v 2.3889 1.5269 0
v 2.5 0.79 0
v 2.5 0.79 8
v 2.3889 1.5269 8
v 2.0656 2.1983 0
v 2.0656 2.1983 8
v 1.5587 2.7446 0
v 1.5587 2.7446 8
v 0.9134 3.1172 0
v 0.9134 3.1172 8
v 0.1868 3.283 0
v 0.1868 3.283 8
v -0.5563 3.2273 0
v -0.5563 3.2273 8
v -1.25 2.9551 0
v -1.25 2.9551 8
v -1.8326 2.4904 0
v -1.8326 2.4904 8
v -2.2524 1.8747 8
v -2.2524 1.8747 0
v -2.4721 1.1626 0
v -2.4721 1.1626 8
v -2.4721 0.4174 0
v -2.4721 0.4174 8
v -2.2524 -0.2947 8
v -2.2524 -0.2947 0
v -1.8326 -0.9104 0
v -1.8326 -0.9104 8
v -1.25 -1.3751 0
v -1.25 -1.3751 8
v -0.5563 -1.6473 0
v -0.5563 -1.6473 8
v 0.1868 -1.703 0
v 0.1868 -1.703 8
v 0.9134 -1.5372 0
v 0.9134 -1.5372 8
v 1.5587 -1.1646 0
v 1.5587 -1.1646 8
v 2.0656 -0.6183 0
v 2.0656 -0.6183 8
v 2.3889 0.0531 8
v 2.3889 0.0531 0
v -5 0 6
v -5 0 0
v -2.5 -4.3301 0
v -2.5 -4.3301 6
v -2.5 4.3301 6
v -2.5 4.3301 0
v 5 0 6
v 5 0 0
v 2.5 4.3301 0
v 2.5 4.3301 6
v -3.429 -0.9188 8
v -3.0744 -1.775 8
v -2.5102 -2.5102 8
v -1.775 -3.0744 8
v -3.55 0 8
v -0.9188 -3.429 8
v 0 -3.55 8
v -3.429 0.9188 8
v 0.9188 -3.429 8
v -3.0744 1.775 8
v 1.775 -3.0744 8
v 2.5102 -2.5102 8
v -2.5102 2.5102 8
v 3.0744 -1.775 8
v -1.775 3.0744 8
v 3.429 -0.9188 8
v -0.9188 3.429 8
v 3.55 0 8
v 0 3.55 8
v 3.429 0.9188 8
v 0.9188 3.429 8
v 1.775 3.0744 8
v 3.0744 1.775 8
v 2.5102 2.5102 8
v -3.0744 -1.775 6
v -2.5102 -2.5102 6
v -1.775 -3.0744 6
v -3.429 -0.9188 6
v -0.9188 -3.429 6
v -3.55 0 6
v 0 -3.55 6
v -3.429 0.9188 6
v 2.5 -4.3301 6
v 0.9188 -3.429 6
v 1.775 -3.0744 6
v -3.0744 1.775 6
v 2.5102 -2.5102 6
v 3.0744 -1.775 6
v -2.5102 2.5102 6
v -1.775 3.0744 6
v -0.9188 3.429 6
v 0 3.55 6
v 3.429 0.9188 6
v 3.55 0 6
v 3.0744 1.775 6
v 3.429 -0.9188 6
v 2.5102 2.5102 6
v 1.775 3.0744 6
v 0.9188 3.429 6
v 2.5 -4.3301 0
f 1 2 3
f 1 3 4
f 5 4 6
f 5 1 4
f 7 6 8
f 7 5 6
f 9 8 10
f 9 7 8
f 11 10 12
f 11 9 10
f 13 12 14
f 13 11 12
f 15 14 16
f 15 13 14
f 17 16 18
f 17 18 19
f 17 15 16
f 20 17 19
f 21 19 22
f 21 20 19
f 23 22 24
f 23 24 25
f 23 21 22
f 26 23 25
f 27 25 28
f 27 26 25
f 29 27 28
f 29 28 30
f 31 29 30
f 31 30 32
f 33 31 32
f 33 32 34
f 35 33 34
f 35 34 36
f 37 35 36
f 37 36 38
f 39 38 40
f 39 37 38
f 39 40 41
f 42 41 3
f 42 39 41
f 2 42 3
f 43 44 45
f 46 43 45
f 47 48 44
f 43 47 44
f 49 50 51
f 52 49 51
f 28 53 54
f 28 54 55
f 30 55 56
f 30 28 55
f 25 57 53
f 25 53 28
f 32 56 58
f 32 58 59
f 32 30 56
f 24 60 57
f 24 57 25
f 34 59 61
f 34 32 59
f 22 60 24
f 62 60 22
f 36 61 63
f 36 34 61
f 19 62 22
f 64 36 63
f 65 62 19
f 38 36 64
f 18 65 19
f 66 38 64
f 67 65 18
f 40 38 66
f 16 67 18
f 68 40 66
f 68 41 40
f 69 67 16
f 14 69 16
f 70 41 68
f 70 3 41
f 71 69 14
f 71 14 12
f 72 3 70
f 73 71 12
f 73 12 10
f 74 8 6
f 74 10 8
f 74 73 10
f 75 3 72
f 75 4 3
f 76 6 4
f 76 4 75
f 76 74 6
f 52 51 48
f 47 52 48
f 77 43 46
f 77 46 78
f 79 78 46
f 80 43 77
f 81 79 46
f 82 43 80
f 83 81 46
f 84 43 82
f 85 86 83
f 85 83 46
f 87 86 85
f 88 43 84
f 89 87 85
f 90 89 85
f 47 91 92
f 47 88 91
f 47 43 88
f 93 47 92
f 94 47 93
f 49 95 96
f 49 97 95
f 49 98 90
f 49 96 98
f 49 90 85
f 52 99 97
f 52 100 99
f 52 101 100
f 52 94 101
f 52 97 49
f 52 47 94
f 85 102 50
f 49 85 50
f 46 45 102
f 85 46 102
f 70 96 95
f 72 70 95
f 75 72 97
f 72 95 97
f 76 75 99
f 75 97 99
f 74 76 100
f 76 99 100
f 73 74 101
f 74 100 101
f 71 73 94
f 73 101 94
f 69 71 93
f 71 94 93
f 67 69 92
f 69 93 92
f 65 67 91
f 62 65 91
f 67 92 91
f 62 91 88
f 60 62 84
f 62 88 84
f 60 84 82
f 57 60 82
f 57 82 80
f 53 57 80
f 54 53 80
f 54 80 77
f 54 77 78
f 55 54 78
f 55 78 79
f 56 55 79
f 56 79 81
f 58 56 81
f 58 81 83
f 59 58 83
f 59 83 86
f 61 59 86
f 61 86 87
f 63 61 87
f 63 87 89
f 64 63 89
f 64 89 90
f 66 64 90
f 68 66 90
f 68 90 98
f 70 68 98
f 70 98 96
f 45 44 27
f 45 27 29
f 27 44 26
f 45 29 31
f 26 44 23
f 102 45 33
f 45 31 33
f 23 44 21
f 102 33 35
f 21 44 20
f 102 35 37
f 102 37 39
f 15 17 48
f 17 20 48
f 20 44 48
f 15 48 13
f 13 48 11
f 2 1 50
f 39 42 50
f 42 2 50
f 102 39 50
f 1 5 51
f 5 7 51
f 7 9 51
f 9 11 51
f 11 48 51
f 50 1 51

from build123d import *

# Parameters (mm, degrees)
F0_R     = 3.55
F1_DEPTH = 6
F0_R_2   = 2.5
F2_DEPTH = 8


with BuildPart() as f1:
    # F0 (on Top) → F1 (new body)
    with BuildSketch(Plane.XY):
        Polygon((2.5, 4.330127), (-2.5, 4.330127), (-5, 0), (-2.5, -4.330127), (2.5, -4.330127), (5, 0), align=None)
        Circle(F0_R, mode=Mode.SUBTRACT)
    extrude(amount=F1_DEPTH)

    # F0 (on Top) → F2 (join)
    with BuildSketch(Plane.XY):
        Circle(F0_R)
        with Locations((0, 0.79)):
            Circle(F0_R_2, mode=Mode.SUBTRACT)
    extrude(amount=F2_DEPTH)


solid = f1.part
